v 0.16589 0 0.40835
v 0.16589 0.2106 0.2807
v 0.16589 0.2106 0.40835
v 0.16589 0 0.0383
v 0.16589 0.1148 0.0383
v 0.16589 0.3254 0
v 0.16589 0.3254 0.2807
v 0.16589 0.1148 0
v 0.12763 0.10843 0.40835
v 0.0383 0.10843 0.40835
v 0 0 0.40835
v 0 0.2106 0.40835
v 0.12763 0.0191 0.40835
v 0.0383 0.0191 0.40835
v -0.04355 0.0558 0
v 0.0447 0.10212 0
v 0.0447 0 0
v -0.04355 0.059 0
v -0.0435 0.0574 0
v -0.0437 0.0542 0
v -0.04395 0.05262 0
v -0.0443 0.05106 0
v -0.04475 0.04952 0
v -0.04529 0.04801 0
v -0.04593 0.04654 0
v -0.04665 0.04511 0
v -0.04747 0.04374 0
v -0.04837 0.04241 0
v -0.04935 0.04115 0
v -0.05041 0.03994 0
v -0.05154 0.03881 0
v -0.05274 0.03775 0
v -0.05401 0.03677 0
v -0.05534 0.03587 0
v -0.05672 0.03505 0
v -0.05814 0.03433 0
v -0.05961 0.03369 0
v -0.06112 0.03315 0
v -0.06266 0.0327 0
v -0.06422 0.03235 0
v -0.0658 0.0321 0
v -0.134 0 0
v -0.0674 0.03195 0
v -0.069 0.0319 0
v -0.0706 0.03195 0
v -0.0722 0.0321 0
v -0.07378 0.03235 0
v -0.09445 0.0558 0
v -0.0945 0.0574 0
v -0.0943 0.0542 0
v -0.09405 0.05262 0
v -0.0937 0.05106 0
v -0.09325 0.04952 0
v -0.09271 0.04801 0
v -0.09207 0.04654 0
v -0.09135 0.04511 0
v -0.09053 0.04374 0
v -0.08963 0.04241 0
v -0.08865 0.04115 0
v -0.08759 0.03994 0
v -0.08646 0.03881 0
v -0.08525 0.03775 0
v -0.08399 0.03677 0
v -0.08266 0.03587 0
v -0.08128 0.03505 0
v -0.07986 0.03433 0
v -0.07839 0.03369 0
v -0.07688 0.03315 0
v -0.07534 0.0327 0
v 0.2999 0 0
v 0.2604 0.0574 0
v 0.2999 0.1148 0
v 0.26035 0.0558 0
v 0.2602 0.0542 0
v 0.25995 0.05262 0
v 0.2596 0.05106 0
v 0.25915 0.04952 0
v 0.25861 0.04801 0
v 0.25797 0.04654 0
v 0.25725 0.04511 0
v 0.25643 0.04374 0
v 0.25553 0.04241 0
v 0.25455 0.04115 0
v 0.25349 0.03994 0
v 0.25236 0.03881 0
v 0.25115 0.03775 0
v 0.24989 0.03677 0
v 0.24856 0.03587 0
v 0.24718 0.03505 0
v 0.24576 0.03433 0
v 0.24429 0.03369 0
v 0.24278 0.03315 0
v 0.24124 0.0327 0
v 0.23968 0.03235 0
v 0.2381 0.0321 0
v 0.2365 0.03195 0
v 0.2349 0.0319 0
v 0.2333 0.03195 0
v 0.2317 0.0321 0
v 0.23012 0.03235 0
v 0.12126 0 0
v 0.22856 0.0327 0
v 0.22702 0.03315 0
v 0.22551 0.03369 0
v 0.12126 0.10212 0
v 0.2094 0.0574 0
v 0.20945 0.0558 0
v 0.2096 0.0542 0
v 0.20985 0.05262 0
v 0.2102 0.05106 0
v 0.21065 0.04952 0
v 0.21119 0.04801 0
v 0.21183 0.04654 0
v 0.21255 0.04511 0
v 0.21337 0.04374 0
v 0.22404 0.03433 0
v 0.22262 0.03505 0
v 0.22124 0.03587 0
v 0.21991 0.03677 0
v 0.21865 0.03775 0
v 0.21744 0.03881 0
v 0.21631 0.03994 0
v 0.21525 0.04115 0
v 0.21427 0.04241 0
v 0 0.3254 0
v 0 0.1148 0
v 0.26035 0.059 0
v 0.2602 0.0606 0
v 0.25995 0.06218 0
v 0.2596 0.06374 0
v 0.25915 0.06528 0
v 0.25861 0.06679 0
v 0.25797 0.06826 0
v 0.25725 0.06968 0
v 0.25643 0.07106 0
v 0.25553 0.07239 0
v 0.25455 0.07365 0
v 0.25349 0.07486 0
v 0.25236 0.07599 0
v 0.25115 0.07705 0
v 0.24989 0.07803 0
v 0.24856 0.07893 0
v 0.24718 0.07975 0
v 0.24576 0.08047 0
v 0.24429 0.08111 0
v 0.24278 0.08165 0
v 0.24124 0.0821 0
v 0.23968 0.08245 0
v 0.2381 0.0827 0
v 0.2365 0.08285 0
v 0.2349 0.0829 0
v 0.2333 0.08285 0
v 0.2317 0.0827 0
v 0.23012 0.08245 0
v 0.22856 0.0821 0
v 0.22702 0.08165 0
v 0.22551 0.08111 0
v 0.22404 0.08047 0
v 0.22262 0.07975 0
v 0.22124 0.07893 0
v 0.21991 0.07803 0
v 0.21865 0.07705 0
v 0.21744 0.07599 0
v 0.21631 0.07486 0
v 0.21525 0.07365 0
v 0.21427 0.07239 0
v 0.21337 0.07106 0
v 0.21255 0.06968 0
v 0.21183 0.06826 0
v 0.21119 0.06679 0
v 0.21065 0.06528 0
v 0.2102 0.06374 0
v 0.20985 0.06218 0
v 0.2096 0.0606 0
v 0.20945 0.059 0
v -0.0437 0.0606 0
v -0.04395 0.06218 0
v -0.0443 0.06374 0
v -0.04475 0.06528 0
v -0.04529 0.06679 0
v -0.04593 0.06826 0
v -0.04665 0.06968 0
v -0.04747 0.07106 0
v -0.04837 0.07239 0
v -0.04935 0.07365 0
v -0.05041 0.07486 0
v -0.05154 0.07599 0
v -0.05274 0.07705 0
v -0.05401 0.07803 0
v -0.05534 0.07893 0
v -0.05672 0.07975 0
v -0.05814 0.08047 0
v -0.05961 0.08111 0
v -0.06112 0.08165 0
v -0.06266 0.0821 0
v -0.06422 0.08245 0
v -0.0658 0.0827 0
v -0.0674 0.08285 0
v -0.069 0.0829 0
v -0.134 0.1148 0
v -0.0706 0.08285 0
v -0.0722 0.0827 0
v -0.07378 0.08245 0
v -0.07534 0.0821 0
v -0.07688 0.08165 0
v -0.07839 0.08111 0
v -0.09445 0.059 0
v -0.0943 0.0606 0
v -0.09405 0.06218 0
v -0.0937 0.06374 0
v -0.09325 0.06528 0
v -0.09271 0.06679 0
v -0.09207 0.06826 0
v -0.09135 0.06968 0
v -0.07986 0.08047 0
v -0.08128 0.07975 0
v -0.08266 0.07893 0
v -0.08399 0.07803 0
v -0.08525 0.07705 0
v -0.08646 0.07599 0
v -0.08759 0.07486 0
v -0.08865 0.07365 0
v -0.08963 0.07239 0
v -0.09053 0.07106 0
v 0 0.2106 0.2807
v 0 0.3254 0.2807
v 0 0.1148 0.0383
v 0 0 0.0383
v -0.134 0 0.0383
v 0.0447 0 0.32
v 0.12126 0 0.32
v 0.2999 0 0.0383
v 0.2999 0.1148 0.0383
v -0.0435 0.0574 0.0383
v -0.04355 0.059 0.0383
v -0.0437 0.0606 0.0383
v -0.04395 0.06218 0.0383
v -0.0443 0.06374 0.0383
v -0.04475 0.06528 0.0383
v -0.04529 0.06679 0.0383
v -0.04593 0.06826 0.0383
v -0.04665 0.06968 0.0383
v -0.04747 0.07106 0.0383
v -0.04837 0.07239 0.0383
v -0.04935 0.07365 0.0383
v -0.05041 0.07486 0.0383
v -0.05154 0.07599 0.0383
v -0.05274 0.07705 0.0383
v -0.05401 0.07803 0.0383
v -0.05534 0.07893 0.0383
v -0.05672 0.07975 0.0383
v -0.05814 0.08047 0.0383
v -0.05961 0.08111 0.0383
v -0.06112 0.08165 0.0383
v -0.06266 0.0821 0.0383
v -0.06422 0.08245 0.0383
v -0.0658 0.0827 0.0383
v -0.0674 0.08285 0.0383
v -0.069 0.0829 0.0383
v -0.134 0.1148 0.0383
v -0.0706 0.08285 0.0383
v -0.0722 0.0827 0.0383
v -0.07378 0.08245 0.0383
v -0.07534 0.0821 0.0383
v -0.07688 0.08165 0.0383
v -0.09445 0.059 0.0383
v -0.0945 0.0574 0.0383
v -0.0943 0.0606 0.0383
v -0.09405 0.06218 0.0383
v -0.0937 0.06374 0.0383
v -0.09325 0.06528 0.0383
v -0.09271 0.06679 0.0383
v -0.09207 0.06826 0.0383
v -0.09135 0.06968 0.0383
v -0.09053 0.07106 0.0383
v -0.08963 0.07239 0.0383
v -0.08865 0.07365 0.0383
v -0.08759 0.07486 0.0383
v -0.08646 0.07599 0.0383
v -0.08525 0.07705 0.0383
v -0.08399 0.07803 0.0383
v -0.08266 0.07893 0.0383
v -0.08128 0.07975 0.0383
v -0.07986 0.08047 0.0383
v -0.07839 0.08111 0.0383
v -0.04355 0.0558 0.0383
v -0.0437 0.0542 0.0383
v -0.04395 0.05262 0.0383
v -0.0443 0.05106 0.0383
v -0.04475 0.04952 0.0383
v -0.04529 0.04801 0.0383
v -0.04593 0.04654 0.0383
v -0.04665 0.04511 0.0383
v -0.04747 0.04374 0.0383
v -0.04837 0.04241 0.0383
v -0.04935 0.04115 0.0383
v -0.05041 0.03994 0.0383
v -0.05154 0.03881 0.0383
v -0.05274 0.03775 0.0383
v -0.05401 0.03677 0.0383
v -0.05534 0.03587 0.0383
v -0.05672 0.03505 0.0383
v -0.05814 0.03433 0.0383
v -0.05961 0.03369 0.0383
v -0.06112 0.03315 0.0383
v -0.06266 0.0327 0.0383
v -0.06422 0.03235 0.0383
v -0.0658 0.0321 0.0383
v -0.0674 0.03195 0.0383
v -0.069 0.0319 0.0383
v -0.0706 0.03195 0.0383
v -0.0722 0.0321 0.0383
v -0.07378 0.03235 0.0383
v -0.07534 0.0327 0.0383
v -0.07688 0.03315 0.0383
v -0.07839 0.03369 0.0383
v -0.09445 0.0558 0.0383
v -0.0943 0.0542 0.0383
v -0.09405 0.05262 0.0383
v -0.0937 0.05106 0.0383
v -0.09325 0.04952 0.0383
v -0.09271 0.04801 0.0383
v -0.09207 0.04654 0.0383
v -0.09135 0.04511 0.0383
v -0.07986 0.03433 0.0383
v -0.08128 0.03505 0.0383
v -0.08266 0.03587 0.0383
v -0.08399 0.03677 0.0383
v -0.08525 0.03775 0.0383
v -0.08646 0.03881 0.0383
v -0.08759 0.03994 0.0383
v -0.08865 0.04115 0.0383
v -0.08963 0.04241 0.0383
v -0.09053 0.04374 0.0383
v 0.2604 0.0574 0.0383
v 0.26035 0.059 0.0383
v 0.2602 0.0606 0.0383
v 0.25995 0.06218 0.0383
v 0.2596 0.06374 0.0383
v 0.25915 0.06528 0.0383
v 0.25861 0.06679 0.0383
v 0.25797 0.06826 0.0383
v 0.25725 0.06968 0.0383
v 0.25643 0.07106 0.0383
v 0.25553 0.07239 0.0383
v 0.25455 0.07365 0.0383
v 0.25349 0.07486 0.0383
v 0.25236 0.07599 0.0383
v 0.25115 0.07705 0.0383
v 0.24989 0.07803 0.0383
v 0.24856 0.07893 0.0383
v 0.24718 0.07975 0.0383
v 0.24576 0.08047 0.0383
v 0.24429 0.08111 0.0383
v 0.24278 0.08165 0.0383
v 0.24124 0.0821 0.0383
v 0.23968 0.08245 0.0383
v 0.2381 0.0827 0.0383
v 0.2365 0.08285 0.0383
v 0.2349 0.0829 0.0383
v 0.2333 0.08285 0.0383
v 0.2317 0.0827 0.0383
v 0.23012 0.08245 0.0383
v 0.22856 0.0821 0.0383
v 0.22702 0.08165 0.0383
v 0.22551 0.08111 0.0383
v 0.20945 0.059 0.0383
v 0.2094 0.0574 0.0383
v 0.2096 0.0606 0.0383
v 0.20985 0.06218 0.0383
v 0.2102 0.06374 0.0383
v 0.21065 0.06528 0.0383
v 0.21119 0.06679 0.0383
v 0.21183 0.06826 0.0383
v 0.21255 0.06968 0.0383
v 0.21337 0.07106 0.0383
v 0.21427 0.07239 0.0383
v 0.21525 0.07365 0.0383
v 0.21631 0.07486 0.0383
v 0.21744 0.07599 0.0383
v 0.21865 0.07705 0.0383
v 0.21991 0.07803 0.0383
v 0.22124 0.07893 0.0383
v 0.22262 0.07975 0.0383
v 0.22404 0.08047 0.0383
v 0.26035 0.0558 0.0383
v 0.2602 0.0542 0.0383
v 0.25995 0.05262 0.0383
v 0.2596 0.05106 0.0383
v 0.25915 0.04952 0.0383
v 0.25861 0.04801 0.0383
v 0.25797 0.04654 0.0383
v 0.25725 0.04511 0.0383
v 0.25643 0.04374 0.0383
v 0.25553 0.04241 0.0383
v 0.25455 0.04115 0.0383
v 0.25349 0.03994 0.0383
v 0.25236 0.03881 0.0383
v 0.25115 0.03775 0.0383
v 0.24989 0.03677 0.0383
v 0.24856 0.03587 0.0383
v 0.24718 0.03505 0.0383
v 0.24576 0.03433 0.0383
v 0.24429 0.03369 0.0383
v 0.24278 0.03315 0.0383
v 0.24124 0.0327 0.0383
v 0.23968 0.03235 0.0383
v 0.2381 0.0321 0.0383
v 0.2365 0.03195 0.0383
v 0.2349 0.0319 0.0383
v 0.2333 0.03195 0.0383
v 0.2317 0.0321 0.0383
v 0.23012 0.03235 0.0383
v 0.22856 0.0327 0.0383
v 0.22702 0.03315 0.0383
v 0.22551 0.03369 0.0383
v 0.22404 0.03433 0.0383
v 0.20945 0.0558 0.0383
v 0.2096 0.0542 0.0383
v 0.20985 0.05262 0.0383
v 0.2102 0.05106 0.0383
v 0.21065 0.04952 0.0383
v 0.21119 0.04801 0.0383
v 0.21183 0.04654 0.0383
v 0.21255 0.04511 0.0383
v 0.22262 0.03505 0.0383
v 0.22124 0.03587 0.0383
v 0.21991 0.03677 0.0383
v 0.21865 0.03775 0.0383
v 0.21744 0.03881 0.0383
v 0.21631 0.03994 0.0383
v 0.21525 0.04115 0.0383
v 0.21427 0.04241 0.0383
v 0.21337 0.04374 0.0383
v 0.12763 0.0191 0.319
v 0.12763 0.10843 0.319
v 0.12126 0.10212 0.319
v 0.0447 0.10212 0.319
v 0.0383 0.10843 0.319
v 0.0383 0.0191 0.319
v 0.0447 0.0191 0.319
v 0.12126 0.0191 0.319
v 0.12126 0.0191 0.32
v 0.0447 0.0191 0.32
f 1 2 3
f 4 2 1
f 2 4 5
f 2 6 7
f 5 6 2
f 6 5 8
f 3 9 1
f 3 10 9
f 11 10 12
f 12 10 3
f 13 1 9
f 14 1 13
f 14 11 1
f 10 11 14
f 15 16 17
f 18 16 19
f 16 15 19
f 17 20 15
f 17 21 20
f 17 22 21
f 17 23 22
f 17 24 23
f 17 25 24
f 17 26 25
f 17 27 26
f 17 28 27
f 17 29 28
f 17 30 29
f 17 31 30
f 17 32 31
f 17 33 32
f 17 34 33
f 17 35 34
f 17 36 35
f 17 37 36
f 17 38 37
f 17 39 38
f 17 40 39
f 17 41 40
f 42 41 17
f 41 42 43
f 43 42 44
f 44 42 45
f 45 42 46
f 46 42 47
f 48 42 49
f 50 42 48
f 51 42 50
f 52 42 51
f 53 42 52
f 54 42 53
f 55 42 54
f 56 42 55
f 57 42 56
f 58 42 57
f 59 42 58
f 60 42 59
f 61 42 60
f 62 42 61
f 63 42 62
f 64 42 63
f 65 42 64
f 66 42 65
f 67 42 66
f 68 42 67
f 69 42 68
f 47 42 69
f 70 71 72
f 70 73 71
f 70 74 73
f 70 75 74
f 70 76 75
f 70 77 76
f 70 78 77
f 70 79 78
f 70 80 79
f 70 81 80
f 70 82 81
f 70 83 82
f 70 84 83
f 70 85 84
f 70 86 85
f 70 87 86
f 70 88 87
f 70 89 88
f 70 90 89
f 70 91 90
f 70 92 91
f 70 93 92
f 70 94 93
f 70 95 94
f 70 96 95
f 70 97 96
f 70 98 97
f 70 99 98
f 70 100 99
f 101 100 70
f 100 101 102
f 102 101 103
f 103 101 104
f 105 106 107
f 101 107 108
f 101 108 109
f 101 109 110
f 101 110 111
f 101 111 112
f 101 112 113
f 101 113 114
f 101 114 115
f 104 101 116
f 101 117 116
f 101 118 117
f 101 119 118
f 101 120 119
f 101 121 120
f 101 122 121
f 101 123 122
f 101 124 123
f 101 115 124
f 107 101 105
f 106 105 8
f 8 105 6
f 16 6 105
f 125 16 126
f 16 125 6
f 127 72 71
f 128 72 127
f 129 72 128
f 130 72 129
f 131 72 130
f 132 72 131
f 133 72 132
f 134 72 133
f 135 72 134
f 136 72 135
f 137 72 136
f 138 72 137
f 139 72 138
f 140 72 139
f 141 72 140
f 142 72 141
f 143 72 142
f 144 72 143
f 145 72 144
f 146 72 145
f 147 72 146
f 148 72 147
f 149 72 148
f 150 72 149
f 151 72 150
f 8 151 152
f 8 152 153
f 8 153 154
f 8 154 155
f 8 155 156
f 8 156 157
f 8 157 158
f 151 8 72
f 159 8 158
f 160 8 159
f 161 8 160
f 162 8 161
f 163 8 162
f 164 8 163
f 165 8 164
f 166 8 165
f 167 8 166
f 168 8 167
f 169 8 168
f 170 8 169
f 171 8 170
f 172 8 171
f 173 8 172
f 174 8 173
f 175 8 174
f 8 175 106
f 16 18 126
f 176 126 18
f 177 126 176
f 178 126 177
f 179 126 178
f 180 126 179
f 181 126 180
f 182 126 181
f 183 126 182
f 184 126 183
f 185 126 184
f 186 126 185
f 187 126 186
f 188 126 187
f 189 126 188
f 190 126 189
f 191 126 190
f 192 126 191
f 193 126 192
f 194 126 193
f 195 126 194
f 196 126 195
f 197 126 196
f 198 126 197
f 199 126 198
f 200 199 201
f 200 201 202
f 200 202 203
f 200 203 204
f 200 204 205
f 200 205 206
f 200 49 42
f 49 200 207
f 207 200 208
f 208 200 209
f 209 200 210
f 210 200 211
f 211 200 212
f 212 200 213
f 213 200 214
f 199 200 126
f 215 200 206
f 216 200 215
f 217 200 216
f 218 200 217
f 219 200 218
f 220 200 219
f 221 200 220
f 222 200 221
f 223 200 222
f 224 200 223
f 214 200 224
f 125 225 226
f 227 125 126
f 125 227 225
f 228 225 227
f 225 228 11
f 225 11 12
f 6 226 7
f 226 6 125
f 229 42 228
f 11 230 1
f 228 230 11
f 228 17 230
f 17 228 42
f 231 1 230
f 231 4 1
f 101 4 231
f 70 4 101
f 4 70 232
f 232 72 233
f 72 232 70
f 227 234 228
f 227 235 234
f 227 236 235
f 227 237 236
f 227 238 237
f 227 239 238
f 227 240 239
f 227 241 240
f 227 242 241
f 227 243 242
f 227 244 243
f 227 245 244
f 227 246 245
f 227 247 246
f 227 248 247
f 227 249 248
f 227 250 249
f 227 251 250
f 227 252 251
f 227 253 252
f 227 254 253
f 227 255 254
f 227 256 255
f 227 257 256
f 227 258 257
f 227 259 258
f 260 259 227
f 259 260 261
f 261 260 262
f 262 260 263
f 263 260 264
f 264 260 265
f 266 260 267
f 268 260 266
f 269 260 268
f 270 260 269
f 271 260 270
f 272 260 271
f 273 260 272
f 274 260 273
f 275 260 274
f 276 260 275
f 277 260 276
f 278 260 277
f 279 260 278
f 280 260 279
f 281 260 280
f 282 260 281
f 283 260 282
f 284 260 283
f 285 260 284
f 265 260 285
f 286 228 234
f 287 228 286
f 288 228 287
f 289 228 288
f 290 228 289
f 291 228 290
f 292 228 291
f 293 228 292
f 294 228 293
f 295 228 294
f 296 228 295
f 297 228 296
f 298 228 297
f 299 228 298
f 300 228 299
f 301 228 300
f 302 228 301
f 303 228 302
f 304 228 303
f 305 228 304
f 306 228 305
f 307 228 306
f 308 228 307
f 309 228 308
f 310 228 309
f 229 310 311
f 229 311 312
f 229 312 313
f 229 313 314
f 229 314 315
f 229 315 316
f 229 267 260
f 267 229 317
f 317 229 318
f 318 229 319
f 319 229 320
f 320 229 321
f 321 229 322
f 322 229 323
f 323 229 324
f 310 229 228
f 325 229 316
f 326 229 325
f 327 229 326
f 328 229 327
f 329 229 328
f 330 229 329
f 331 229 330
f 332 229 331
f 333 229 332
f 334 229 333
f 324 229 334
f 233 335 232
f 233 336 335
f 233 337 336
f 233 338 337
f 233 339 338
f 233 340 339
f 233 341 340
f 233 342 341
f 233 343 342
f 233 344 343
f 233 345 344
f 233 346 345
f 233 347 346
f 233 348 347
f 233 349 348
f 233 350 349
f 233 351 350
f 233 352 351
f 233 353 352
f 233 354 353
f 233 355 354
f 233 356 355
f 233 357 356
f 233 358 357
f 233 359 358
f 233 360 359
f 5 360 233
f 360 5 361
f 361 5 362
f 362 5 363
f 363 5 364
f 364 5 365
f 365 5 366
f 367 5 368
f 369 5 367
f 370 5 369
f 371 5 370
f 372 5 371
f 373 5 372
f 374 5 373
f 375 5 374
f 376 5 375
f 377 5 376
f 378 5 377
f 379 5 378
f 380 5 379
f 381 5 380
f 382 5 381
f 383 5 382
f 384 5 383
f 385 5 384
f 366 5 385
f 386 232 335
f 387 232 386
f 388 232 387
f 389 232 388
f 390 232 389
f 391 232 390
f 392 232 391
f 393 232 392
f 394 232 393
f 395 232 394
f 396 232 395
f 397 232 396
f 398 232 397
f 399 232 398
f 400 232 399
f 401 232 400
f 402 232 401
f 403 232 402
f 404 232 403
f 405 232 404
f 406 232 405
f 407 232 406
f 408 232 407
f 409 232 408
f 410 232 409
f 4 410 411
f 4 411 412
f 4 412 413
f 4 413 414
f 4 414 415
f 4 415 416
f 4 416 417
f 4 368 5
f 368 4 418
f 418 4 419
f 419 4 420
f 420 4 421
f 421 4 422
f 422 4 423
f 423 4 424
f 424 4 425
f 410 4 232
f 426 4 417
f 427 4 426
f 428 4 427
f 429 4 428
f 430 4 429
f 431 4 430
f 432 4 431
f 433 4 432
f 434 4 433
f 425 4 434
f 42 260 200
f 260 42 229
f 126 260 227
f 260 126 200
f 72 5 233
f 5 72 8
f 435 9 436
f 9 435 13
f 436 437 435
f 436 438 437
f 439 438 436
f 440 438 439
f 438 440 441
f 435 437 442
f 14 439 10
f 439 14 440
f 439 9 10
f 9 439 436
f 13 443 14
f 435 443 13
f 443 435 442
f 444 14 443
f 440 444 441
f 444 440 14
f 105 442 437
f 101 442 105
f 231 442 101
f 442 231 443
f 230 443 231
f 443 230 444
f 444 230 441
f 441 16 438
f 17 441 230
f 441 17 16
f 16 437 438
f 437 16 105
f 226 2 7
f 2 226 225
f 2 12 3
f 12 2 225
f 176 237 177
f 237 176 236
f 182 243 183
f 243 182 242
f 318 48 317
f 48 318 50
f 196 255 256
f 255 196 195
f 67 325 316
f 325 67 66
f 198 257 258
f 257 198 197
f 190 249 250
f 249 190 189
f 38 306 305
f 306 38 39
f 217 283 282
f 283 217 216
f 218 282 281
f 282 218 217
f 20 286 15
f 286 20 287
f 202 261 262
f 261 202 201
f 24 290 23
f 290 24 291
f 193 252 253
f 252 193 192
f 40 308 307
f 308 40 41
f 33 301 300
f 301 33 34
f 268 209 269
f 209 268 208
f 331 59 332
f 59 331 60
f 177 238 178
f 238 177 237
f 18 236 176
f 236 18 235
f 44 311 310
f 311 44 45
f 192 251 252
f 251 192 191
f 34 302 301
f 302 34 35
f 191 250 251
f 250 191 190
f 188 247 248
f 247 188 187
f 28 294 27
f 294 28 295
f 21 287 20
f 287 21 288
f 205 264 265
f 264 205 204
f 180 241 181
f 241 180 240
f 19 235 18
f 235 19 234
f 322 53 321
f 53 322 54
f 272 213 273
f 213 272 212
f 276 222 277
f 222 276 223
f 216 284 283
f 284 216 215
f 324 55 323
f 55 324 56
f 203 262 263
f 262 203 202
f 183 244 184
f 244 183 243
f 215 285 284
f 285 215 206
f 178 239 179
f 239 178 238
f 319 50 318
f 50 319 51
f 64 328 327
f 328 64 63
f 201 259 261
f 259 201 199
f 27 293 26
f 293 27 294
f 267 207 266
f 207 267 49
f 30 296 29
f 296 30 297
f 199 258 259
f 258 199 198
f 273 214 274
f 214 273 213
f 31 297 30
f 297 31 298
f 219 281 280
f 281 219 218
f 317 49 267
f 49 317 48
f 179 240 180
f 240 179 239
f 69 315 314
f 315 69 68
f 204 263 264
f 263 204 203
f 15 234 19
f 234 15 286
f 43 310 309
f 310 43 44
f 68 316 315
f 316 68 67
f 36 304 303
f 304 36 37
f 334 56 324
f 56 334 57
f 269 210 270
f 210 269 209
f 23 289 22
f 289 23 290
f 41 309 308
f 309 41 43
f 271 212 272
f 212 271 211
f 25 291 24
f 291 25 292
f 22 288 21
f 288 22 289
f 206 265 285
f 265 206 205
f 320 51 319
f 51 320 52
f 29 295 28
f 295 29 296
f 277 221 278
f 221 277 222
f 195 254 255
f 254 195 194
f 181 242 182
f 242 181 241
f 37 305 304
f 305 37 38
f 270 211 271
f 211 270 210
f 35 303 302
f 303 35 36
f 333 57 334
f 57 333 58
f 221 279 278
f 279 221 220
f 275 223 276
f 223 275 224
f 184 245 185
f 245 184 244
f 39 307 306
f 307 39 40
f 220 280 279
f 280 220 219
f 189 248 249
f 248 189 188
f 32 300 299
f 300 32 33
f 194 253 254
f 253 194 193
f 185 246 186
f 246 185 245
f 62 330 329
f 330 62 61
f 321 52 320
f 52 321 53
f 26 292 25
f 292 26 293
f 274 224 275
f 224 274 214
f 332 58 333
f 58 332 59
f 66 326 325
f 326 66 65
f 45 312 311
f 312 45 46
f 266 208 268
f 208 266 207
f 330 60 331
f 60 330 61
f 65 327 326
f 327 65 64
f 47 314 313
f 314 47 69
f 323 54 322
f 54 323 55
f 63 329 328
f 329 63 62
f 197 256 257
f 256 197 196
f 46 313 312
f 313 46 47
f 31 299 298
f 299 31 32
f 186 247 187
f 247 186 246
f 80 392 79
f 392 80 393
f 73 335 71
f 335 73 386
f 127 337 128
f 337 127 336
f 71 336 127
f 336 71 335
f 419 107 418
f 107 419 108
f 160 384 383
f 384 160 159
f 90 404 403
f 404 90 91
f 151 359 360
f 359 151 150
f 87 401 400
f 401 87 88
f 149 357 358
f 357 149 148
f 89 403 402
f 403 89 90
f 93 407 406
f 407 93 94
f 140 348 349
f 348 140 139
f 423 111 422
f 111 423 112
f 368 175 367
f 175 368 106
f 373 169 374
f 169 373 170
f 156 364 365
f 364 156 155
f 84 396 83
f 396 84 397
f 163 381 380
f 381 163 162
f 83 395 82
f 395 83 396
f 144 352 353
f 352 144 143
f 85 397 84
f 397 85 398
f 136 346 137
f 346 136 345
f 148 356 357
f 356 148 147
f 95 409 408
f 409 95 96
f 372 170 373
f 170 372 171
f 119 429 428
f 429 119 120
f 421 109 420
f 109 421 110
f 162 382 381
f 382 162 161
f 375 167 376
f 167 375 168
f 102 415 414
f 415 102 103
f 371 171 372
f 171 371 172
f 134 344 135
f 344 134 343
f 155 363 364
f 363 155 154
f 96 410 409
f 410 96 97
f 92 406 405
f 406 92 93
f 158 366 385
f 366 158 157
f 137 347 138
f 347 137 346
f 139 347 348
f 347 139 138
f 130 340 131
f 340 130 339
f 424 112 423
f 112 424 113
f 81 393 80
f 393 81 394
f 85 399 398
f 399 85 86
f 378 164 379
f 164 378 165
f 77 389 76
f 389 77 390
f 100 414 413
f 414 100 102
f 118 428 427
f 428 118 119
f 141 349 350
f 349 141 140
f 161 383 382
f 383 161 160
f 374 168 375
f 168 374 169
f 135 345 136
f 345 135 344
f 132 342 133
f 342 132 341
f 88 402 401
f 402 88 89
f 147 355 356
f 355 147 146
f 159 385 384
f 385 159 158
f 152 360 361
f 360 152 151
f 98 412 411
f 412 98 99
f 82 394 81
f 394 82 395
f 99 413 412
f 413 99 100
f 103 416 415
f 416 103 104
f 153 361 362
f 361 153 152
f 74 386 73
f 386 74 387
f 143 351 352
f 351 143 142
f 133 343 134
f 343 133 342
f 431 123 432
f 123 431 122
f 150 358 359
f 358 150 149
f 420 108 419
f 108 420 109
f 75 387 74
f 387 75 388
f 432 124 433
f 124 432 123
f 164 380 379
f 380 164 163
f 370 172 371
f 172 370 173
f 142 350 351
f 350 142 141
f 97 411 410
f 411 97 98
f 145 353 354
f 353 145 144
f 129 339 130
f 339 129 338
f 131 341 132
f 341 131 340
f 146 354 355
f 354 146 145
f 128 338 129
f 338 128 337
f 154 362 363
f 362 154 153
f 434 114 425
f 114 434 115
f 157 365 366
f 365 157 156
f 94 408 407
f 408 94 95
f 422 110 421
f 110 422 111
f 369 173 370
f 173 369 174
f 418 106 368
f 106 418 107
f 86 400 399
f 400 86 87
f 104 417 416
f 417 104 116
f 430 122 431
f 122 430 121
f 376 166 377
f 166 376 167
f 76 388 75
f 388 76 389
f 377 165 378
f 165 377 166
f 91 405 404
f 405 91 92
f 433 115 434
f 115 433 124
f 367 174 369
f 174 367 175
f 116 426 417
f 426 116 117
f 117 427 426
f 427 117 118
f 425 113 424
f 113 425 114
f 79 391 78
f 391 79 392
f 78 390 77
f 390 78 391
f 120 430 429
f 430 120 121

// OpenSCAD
// Resolution for curved features
$fn = 100;

// ====================
// PARAMETRIC VARIABLES
// ====================

// Main Base Dimensions
base_len = 0.165891;
base_wid = 0.325401;
base_ht  = 0.408347;

// Top Square Recess
rec_len = 0.089326;
rec_wid = 0.089326;
rec_x   = 0.0383;   // Left edge offset
rec_y   = 0.0191;   // Front edge offset
rec_z   = 0.319;    // Start height of cut

// Lower Rectangular Opening
low_len = 0.076565;
low_wid = 0.132416;
low_x   = 0.0447;   // Left edge offset
low_y   = -0.0303;  // Front offset (breaks out front face)
low_ht  = 0.319;    // Height of opening

// Upper Back Strip Cutaway
back_wid = 0.114848;
back_y   = 0.2106;  // Front edge of cut (leaves 0.2106 in front)
back_z   = 0.2807;  // Start height of cut
back_ht  = 0.1276;  // Cut depth

// Shallow Base-Level Section
sh_ht  = 0.0383;
sh_len = 0.4339;
sh_wid = 0.1148;
sh_x   = -0.134;    // Projects 0.134 beyond left side

// Circular Through Openings
hole_r  = 0.0255;
hole_y  = 0.0574;   // Front offset line
hole1_x = -0.069;   // Left offset relative to base left edge
hole2_x = 0.2349;   // Left offset relative to base left edge

// ====================
// MAIN MODEL CONSTRUCTION
// ====================

difference() {
    // Combine main base and shallow added section
    union() {
        // Main rectangular solid base
        cube([base_len, base_wid, base_ht]);

        // Shallow solid base-level section
        translate([sh_x, 0, 0])
            cube([sh_len, sh_wid, sh_ht]);
    }

    // 1. Top square recess (cuts from 0.319 to top)
    translate([rec_x, rec_y, rec_z])
        cube([rec_len, rec_wid, base_ht - rec_z + 0.001]);

    // 2. Lower rectangular opening (cuts from z=0 to 0.319)
    translate([low_x, low_y, 0])
        cube([low_len, low_wid, low_ht + 0.001]);

    // 3. Upper back strip cutaway (creates high-to-low step)
    translate([0, back_y, back_z])
        cube([base_len, back_wid + 0.001, back_ht + 0.001]);

    // 4. Two circular through openings in shallow section
    translate([hole1_x, hole_y, -0.001])
        cylinder(h=sh_ht + 0.002, r=hole_r);
    translate([hole2_x, hole_y, -0.001])
        cylinder(h=sh_ht + 0.002, r=hole_r);
}
